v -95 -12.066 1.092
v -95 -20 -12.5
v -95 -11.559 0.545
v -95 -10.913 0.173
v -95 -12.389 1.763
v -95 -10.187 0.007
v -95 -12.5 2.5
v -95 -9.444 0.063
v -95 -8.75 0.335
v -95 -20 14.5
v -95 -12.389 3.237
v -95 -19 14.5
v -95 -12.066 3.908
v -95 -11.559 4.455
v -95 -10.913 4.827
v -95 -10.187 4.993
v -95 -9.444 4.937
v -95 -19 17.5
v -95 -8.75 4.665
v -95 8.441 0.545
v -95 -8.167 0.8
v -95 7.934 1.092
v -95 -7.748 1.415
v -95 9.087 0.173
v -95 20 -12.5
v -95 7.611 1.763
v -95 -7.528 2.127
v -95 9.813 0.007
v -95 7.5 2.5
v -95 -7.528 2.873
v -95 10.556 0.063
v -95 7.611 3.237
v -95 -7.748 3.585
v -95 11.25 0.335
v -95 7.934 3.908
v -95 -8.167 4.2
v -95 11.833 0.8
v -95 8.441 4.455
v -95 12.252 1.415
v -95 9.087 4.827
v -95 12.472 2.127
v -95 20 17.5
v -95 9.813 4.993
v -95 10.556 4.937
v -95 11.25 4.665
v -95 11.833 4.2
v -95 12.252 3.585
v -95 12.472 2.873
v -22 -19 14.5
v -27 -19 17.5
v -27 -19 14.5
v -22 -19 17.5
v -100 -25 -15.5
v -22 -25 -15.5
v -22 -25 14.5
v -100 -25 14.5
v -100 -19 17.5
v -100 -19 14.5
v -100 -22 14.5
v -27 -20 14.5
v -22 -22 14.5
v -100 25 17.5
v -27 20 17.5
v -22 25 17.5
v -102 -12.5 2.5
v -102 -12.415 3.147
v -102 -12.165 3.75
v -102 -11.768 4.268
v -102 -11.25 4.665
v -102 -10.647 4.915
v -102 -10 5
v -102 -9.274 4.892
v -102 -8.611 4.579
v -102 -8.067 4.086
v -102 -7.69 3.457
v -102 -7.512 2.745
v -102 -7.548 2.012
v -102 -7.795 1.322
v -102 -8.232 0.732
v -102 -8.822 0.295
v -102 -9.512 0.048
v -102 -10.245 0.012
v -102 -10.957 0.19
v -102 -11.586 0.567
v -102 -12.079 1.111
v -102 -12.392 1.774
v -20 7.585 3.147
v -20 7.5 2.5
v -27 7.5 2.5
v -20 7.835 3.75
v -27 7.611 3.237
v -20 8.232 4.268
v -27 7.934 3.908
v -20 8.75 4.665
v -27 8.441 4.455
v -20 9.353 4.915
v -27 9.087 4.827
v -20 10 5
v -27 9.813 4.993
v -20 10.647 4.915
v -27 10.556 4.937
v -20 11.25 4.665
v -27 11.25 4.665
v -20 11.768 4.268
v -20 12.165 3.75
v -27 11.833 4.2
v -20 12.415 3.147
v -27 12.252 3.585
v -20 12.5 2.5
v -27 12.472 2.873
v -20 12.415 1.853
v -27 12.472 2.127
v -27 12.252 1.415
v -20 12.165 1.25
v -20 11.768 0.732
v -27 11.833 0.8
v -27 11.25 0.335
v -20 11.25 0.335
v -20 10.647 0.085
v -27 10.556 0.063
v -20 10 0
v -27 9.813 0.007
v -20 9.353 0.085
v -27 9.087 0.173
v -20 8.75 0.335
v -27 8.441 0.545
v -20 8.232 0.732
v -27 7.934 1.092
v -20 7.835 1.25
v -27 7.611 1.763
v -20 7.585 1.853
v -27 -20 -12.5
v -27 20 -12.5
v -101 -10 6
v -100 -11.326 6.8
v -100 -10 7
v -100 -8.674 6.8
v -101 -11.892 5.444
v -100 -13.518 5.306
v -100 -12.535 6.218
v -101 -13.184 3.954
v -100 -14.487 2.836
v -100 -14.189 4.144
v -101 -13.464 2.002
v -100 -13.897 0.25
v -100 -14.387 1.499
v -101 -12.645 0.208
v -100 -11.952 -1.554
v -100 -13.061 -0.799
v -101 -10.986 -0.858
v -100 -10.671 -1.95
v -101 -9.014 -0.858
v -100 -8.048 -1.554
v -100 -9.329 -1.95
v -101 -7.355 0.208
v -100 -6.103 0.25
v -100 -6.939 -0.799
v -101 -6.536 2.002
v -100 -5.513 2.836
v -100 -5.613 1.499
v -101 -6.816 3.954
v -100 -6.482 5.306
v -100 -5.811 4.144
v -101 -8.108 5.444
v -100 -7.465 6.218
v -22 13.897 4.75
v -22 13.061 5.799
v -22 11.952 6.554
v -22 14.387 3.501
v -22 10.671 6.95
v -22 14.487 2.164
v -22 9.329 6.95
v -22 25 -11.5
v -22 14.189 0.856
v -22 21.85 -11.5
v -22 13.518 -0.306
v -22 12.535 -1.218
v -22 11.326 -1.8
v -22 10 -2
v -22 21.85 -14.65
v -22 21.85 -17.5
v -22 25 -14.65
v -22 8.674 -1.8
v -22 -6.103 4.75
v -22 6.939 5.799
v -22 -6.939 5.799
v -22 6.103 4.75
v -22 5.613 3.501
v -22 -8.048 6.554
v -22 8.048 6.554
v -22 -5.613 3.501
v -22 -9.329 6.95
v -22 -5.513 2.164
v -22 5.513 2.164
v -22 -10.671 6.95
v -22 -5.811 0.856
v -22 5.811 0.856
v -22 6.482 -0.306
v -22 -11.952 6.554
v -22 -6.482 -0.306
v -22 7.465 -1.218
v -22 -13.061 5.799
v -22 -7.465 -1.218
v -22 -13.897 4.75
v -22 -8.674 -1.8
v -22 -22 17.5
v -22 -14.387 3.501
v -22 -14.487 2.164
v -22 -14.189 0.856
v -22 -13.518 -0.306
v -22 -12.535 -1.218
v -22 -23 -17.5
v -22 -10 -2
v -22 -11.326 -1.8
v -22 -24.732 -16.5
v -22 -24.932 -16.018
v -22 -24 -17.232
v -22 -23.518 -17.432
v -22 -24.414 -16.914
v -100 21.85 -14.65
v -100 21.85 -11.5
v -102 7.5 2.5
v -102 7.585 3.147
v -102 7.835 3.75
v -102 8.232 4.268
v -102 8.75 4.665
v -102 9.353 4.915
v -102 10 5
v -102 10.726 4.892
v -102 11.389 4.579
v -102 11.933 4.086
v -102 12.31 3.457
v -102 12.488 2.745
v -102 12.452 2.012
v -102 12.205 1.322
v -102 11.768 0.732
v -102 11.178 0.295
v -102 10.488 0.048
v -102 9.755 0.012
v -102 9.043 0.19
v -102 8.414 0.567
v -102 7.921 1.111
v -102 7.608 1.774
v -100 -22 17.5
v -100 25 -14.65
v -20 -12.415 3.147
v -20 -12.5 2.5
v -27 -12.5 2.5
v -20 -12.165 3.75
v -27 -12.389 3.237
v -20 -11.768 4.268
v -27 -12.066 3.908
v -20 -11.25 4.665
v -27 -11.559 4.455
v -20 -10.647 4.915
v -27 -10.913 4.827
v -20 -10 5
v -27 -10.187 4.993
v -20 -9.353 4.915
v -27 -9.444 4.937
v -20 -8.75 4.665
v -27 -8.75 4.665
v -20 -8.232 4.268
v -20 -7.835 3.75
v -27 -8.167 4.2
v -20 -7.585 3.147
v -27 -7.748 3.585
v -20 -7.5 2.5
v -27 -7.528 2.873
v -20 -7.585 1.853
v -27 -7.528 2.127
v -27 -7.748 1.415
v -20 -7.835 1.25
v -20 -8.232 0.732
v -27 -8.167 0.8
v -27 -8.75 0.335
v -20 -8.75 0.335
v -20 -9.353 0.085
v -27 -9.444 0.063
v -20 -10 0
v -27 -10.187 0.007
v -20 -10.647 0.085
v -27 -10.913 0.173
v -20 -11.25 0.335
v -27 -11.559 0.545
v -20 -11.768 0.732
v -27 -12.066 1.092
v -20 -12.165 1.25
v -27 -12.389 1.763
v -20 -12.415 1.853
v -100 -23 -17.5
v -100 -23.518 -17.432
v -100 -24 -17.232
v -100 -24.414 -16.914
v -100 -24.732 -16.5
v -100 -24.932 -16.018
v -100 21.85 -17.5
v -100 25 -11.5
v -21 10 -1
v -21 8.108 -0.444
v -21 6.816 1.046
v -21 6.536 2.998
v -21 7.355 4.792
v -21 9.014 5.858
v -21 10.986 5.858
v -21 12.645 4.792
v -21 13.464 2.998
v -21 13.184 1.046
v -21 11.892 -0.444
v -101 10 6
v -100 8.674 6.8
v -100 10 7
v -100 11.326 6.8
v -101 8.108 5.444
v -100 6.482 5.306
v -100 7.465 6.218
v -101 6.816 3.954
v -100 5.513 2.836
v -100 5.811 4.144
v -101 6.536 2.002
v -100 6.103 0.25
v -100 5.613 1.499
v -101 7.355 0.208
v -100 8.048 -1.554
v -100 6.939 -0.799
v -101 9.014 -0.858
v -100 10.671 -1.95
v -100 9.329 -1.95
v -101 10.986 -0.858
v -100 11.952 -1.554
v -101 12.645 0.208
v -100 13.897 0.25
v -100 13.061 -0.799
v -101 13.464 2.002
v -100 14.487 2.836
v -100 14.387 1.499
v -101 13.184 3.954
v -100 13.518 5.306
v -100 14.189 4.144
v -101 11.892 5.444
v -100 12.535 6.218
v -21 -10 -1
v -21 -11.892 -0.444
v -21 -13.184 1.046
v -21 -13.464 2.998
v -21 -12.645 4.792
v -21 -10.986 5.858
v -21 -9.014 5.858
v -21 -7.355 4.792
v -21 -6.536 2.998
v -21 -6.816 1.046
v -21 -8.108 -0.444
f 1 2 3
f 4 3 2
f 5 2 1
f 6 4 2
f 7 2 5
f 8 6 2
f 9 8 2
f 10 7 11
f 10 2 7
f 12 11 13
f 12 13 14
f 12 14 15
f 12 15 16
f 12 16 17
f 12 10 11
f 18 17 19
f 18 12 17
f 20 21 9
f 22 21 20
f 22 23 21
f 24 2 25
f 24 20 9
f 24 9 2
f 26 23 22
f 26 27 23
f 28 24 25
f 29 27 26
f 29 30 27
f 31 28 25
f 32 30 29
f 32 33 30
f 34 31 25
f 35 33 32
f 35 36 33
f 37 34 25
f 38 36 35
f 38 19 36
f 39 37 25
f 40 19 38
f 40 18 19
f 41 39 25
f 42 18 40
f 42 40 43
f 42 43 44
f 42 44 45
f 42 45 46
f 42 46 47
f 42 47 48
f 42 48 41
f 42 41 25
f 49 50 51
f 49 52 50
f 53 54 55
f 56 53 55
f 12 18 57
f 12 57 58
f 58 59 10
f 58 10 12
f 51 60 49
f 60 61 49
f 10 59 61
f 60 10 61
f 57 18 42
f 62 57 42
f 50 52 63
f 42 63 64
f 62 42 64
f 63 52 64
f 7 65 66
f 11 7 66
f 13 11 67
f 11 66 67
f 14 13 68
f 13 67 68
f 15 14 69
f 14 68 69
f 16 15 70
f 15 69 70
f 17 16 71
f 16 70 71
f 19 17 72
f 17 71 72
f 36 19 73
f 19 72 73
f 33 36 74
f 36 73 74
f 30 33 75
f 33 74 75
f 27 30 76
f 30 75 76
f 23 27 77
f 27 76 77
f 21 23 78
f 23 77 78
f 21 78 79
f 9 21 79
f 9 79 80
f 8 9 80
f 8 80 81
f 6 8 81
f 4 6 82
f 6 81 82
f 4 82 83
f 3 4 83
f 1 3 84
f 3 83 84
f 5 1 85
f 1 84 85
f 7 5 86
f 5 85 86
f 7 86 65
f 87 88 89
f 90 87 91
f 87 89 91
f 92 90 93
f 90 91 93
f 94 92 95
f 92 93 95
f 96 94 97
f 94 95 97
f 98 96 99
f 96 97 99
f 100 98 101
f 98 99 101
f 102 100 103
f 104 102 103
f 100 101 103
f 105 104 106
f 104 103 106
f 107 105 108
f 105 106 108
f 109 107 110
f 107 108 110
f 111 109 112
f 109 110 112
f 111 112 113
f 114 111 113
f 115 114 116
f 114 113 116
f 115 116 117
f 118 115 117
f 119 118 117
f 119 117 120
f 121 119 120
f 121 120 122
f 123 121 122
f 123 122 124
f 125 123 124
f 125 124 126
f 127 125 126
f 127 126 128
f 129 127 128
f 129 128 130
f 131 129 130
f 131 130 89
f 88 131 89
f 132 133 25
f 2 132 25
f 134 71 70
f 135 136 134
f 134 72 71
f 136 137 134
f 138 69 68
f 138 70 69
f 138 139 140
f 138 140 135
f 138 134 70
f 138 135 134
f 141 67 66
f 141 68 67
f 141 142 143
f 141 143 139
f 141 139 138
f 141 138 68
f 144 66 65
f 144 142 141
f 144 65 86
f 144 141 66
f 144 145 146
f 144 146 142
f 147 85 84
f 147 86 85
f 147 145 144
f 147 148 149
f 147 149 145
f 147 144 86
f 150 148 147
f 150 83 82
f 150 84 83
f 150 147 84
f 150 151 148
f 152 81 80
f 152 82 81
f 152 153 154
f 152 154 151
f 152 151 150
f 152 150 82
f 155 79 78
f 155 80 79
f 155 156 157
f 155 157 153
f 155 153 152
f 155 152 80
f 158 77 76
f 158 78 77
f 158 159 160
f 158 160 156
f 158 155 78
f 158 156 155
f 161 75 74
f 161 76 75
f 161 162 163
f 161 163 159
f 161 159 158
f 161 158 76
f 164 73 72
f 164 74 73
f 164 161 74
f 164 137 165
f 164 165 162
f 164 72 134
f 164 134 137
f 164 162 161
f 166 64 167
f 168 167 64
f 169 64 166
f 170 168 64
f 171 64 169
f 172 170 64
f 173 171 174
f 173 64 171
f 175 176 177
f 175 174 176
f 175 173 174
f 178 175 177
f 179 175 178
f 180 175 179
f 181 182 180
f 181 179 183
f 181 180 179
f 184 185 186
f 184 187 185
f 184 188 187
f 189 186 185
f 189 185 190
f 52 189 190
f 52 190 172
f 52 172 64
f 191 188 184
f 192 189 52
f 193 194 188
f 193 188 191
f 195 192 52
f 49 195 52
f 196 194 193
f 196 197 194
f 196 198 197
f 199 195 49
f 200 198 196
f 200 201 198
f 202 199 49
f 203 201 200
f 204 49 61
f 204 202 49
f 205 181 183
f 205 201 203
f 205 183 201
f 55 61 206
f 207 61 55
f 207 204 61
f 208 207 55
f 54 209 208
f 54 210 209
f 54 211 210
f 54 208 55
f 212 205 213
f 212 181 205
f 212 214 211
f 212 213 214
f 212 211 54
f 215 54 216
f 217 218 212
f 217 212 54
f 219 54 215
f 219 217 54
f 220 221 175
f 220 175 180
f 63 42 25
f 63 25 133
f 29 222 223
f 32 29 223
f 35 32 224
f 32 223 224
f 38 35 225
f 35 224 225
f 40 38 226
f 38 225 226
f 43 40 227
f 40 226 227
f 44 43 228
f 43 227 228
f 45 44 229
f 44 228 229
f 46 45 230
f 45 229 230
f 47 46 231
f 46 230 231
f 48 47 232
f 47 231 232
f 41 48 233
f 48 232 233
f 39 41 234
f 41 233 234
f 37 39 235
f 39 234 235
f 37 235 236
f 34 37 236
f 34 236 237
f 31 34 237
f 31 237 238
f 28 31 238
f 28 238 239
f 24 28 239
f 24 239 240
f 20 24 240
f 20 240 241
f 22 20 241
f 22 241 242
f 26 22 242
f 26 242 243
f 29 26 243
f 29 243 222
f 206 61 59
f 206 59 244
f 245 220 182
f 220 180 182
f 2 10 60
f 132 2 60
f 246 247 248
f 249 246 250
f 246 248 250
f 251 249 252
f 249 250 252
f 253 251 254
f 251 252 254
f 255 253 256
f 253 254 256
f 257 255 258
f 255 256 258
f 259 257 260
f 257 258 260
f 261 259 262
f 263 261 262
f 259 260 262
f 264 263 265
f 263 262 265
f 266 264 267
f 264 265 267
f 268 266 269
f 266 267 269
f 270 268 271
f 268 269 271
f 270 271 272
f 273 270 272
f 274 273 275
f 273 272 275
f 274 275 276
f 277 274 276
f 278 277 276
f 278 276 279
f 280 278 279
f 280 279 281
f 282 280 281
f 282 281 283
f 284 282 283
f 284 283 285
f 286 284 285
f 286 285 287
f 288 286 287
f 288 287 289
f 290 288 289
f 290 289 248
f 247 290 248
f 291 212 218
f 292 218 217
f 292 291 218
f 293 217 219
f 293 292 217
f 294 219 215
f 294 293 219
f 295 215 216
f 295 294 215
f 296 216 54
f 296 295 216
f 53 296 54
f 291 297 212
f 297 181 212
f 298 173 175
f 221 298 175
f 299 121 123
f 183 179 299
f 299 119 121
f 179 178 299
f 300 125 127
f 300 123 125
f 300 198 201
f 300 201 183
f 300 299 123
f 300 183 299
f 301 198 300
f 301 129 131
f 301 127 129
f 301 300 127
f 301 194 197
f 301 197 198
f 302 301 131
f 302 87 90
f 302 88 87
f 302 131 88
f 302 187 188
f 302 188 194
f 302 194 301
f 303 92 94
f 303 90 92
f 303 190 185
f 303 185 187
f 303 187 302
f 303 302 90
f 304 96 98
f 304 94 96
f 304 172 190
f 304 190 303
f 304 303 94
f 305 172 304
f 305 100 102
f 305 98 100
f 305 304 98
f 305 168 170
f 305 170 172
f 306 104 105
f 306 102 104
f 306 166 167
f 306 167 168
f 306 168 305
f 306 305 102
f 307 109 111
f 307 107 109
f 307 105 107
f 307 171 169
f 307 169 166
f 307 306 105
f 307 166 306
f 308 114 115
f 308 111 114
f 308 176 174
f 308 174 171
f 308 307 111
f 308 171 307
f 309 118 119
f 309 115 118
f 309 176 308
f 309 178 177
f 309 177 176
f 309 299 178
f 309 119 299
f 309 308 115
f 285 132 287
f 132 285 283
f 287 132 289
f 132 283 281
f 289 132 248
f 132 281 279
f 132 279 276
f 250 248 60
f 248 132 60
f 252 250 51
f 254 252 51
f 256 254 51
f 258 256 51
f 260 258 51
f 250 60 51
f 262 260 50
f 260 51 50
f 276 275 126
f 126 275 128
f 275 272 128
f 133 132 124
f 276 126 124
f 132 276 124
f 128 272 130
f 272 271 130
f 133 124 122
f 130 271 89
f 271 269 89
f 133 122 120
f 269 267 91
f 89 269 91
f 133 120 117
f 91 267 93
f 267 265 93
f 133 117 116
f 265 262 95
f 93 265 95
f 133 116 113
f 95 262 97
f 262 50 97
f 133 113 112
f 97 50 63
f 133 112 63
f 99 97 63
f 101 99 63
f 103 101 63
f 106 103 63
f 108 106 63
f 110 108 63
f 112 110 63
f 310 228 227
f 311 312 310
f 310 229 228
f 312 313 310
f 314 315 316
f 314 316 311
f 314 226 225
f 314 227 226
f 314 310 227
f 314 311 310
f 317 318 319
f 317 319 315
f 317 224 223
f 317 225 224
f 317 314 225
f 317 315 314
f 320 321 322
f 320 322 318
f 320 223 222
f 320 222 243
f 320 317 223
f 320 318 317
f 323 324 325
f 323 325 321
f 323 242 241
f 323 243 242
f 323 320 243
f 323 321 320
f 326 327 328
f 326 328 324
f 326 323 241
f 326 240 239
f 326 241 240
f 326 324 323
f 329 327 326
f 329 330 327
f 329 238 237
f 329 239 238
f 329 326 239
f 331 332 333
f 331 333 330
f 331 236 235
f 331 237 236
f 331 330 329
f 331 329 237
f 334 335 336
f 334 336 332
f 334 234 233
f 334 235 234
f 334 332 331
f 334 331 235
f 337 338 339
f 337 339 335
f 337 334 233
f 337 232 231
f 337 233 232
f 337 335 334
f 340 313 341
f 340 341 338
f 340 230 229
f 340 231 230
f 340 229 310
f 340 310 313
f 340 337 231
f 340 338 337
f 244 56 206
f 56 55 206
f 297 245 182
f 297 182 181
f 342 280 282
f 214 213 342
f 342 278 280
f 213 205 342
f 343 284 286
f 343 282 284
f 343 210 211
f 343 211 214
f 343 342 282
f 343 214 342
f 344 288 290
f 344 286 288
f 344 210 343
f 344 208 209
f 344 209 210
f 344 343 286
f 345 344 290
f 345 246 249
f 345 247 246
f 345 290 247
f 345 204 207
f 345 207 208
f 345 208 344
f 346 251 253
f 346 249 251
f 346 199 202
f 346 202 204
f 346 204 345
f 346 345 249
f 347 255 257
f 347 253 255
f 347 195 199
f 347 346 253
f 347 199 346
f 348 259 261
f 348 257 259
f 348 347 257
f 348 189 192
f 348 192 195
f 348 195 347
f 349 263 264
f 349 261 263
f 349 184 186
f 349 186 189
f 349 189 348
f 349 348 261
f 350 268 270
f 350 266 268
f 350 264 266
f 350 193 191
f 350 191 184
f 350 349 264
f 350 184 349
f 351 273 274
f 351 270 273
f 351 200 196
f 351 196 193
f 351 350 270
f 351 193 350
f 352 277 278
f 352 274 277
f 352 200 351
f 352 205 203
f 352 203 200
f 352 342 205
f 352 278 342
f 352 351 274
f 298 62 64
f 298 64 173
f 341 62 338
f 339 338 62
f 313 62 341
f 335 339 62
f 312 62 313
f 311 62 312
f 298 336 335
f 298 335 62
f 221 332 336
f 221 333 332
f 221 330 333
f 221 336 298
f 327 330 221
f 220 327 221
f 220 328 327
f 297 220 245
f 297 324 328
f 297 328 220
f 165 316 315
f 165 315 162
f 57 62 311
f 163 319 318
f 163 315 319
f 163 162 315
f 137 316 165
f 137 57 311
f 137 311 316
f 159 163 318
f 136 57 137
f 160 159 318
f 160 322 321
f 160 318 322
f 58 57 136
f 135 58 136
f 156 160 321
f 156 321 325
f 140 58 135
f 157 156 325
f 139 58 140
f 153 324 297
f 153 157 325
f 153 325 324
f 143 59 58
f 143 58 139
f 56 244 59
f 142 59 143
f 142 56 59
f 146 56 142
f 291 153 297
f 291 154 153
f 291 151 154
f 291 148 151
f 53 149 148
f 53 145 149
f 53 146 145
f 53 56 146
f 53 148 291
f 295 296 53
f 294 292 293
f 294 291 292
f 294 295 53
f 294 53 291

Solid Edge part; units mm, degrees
sketch "Sketch1" plane through (0, 0, 0) normal (-1, 0, 0) x (0, -1, 0)
  line L0 (25, -17.5) -> (25, 17.5)
  line L1 (25, 17.5) -> (-25, 17.5)
  line L2 (-25, 17.5) -> (-25, -17.5)
  line L3 (-25, -17.5) -> (25, -17.5)
  dimension "D1" = 35
  dimension "D2" = 50
extrude "Protrusion1" add sketch "Sketch1" along normal blind 100
sketch "Sketch2" plane through (-50, 0, 17.5) normal (0, 0, 1) x (0, 1, 0)
  line L0 (20, 45) -> (20, -23)
  line L1 (-20, -23) -> (20, -23)
  line L2 (-20, 45) -> (-20, -23)
  line L3 (-20, 45) -> (20, 45)
  dimension "D1" = 68
  dimension "D2" = 5
  dimension "D3" = 5
extrude "Cutout1" cut sketch "Sketch2" against normal blind 30
fillet "Round_8" radius 2 1 edges at (-50, -25, -17.5)
sketch "Sketch3" plane through (-50, -0.575, -17.5) normal (0, 0, -1) x (0, -1, 0)
  line L0 (-38.1032, -28) -> (40.7023, -28)
  line L1 (40.7023, -54.8488) -> (40.7023, -28)
  line L2 (-38.1032, -54.8488) -> (40.7023, -54.8488)
  line L3 (-38.1032, -28) -> (-38.1032, -54.8488)
  dimension "D1" = 78.8054
  dimension "D2" = 22
  dimension "D3" = 26.8488
  dimension "D4" = 78.8054
extrude "ExtrudedCutout_43" cut sketch "Sketch3" against normal blind 65
sketch "Sketch4" plane through (0, 0, 0) normal (1, 0, 0) x (0, -1, 0)
  line L0 (-25, 11.5) -> (-21.85, 11.5)
  line L1 (-21.85, 11.5) -> (-21.85, 14.65)
  line L2 (-21.85, 14.65) -> (-25, 14.65)
  line L3 (-25, 14.65) -> (-21.85, 17.5)
  line L4 (-21.85, 17.5) -> (-21.85, 20.916)
  line L5 (-21.85, 20.916) -> (-29.169, 20.916)
  line L6 (-29.169, 20.916) -> (-29.169, 11.5)
  line L7 (-29.169, 11.5) -> (-25, 11.5)
  dimension "D1" = 3.15
  dimension "D2" = 3.15
  dimension "D3" = 4.2479
  dimension "D4" = 3.416
  dimension "D5" = 7.319
  dimension "D6" = 9.416
  dimension "D7" = 4.169
extrude "Cutout2" cut sketch "Sketch4" against normal blind 112
sketch "Sketch5" plane through (-100, 0, 0) normal (-1, 0, 0) x (0, 0, 1)
  circle A0 centre (2.5, 10) radius 4.5
  circle A1 centre (2.5, -10) radius 4.5
extrude "ExtrudedProtrusion_35" add sketch "Sketch5" along normal blind 2
sketch "Sketch6" plane through (-22, 0, 0) normal (1, 0, 0) x (0, 0, -1)
  circle A0 centre (-2.5, 10) radius 4.5
  circle A1 centre (-2.5, -10) radius 4.5
extrude "ExtrudedProtrusion_36" add sketch "Sketch6" along normal blind 2
sketch "Sketch7" plane through (-105, 10, 2.5) normal (-1, 0, 0) x (0, -1, 0)
  circle A0 centre (0, 0) radius 2.5
  circle A1 centre (20, 0) radius 2.5
extrude "ExtrudedCutout_41" cut sketch "Sketch7" against normal blind 159
chamfer "Chamfer1" distance 2 angle 45 2 edges at (-20, 10, 7) (-20, -10, 7)
chamfer "Chamfer_23" distance 2 angle 45 2 edges at (-102, -10, -2) (-102, 10, -2)
sketch "Sketch8" plane through (-22, 0, 0) normal (1, 0, 0) x (0, 0, -1)
  line L0 (-14.5, -22) -> (-17.5, -22)
  line L1 (-14.5, -25) -> (-17.5, -22)
  line L2 (-20.4814, -28.0756) -> (-14.5, -25)
  line L3 (-20.4814, -19) -> (-20.4814, -28.0756)
  line L4 (-20.4814, -19) -> (-14.5, -19)
  line L5 (-14.5, -22) -> (-14.5, -19)
  dimension "D1" = 5.9814
  dimension "D2" = 3
  dimension "D3" = 4.2426
  dimension "D4" = 9.0756
  dimension "D5" = 6.7258
extrude "ExtrudedCutout_46" cut sketch "Sketch8" against normal blind 92
